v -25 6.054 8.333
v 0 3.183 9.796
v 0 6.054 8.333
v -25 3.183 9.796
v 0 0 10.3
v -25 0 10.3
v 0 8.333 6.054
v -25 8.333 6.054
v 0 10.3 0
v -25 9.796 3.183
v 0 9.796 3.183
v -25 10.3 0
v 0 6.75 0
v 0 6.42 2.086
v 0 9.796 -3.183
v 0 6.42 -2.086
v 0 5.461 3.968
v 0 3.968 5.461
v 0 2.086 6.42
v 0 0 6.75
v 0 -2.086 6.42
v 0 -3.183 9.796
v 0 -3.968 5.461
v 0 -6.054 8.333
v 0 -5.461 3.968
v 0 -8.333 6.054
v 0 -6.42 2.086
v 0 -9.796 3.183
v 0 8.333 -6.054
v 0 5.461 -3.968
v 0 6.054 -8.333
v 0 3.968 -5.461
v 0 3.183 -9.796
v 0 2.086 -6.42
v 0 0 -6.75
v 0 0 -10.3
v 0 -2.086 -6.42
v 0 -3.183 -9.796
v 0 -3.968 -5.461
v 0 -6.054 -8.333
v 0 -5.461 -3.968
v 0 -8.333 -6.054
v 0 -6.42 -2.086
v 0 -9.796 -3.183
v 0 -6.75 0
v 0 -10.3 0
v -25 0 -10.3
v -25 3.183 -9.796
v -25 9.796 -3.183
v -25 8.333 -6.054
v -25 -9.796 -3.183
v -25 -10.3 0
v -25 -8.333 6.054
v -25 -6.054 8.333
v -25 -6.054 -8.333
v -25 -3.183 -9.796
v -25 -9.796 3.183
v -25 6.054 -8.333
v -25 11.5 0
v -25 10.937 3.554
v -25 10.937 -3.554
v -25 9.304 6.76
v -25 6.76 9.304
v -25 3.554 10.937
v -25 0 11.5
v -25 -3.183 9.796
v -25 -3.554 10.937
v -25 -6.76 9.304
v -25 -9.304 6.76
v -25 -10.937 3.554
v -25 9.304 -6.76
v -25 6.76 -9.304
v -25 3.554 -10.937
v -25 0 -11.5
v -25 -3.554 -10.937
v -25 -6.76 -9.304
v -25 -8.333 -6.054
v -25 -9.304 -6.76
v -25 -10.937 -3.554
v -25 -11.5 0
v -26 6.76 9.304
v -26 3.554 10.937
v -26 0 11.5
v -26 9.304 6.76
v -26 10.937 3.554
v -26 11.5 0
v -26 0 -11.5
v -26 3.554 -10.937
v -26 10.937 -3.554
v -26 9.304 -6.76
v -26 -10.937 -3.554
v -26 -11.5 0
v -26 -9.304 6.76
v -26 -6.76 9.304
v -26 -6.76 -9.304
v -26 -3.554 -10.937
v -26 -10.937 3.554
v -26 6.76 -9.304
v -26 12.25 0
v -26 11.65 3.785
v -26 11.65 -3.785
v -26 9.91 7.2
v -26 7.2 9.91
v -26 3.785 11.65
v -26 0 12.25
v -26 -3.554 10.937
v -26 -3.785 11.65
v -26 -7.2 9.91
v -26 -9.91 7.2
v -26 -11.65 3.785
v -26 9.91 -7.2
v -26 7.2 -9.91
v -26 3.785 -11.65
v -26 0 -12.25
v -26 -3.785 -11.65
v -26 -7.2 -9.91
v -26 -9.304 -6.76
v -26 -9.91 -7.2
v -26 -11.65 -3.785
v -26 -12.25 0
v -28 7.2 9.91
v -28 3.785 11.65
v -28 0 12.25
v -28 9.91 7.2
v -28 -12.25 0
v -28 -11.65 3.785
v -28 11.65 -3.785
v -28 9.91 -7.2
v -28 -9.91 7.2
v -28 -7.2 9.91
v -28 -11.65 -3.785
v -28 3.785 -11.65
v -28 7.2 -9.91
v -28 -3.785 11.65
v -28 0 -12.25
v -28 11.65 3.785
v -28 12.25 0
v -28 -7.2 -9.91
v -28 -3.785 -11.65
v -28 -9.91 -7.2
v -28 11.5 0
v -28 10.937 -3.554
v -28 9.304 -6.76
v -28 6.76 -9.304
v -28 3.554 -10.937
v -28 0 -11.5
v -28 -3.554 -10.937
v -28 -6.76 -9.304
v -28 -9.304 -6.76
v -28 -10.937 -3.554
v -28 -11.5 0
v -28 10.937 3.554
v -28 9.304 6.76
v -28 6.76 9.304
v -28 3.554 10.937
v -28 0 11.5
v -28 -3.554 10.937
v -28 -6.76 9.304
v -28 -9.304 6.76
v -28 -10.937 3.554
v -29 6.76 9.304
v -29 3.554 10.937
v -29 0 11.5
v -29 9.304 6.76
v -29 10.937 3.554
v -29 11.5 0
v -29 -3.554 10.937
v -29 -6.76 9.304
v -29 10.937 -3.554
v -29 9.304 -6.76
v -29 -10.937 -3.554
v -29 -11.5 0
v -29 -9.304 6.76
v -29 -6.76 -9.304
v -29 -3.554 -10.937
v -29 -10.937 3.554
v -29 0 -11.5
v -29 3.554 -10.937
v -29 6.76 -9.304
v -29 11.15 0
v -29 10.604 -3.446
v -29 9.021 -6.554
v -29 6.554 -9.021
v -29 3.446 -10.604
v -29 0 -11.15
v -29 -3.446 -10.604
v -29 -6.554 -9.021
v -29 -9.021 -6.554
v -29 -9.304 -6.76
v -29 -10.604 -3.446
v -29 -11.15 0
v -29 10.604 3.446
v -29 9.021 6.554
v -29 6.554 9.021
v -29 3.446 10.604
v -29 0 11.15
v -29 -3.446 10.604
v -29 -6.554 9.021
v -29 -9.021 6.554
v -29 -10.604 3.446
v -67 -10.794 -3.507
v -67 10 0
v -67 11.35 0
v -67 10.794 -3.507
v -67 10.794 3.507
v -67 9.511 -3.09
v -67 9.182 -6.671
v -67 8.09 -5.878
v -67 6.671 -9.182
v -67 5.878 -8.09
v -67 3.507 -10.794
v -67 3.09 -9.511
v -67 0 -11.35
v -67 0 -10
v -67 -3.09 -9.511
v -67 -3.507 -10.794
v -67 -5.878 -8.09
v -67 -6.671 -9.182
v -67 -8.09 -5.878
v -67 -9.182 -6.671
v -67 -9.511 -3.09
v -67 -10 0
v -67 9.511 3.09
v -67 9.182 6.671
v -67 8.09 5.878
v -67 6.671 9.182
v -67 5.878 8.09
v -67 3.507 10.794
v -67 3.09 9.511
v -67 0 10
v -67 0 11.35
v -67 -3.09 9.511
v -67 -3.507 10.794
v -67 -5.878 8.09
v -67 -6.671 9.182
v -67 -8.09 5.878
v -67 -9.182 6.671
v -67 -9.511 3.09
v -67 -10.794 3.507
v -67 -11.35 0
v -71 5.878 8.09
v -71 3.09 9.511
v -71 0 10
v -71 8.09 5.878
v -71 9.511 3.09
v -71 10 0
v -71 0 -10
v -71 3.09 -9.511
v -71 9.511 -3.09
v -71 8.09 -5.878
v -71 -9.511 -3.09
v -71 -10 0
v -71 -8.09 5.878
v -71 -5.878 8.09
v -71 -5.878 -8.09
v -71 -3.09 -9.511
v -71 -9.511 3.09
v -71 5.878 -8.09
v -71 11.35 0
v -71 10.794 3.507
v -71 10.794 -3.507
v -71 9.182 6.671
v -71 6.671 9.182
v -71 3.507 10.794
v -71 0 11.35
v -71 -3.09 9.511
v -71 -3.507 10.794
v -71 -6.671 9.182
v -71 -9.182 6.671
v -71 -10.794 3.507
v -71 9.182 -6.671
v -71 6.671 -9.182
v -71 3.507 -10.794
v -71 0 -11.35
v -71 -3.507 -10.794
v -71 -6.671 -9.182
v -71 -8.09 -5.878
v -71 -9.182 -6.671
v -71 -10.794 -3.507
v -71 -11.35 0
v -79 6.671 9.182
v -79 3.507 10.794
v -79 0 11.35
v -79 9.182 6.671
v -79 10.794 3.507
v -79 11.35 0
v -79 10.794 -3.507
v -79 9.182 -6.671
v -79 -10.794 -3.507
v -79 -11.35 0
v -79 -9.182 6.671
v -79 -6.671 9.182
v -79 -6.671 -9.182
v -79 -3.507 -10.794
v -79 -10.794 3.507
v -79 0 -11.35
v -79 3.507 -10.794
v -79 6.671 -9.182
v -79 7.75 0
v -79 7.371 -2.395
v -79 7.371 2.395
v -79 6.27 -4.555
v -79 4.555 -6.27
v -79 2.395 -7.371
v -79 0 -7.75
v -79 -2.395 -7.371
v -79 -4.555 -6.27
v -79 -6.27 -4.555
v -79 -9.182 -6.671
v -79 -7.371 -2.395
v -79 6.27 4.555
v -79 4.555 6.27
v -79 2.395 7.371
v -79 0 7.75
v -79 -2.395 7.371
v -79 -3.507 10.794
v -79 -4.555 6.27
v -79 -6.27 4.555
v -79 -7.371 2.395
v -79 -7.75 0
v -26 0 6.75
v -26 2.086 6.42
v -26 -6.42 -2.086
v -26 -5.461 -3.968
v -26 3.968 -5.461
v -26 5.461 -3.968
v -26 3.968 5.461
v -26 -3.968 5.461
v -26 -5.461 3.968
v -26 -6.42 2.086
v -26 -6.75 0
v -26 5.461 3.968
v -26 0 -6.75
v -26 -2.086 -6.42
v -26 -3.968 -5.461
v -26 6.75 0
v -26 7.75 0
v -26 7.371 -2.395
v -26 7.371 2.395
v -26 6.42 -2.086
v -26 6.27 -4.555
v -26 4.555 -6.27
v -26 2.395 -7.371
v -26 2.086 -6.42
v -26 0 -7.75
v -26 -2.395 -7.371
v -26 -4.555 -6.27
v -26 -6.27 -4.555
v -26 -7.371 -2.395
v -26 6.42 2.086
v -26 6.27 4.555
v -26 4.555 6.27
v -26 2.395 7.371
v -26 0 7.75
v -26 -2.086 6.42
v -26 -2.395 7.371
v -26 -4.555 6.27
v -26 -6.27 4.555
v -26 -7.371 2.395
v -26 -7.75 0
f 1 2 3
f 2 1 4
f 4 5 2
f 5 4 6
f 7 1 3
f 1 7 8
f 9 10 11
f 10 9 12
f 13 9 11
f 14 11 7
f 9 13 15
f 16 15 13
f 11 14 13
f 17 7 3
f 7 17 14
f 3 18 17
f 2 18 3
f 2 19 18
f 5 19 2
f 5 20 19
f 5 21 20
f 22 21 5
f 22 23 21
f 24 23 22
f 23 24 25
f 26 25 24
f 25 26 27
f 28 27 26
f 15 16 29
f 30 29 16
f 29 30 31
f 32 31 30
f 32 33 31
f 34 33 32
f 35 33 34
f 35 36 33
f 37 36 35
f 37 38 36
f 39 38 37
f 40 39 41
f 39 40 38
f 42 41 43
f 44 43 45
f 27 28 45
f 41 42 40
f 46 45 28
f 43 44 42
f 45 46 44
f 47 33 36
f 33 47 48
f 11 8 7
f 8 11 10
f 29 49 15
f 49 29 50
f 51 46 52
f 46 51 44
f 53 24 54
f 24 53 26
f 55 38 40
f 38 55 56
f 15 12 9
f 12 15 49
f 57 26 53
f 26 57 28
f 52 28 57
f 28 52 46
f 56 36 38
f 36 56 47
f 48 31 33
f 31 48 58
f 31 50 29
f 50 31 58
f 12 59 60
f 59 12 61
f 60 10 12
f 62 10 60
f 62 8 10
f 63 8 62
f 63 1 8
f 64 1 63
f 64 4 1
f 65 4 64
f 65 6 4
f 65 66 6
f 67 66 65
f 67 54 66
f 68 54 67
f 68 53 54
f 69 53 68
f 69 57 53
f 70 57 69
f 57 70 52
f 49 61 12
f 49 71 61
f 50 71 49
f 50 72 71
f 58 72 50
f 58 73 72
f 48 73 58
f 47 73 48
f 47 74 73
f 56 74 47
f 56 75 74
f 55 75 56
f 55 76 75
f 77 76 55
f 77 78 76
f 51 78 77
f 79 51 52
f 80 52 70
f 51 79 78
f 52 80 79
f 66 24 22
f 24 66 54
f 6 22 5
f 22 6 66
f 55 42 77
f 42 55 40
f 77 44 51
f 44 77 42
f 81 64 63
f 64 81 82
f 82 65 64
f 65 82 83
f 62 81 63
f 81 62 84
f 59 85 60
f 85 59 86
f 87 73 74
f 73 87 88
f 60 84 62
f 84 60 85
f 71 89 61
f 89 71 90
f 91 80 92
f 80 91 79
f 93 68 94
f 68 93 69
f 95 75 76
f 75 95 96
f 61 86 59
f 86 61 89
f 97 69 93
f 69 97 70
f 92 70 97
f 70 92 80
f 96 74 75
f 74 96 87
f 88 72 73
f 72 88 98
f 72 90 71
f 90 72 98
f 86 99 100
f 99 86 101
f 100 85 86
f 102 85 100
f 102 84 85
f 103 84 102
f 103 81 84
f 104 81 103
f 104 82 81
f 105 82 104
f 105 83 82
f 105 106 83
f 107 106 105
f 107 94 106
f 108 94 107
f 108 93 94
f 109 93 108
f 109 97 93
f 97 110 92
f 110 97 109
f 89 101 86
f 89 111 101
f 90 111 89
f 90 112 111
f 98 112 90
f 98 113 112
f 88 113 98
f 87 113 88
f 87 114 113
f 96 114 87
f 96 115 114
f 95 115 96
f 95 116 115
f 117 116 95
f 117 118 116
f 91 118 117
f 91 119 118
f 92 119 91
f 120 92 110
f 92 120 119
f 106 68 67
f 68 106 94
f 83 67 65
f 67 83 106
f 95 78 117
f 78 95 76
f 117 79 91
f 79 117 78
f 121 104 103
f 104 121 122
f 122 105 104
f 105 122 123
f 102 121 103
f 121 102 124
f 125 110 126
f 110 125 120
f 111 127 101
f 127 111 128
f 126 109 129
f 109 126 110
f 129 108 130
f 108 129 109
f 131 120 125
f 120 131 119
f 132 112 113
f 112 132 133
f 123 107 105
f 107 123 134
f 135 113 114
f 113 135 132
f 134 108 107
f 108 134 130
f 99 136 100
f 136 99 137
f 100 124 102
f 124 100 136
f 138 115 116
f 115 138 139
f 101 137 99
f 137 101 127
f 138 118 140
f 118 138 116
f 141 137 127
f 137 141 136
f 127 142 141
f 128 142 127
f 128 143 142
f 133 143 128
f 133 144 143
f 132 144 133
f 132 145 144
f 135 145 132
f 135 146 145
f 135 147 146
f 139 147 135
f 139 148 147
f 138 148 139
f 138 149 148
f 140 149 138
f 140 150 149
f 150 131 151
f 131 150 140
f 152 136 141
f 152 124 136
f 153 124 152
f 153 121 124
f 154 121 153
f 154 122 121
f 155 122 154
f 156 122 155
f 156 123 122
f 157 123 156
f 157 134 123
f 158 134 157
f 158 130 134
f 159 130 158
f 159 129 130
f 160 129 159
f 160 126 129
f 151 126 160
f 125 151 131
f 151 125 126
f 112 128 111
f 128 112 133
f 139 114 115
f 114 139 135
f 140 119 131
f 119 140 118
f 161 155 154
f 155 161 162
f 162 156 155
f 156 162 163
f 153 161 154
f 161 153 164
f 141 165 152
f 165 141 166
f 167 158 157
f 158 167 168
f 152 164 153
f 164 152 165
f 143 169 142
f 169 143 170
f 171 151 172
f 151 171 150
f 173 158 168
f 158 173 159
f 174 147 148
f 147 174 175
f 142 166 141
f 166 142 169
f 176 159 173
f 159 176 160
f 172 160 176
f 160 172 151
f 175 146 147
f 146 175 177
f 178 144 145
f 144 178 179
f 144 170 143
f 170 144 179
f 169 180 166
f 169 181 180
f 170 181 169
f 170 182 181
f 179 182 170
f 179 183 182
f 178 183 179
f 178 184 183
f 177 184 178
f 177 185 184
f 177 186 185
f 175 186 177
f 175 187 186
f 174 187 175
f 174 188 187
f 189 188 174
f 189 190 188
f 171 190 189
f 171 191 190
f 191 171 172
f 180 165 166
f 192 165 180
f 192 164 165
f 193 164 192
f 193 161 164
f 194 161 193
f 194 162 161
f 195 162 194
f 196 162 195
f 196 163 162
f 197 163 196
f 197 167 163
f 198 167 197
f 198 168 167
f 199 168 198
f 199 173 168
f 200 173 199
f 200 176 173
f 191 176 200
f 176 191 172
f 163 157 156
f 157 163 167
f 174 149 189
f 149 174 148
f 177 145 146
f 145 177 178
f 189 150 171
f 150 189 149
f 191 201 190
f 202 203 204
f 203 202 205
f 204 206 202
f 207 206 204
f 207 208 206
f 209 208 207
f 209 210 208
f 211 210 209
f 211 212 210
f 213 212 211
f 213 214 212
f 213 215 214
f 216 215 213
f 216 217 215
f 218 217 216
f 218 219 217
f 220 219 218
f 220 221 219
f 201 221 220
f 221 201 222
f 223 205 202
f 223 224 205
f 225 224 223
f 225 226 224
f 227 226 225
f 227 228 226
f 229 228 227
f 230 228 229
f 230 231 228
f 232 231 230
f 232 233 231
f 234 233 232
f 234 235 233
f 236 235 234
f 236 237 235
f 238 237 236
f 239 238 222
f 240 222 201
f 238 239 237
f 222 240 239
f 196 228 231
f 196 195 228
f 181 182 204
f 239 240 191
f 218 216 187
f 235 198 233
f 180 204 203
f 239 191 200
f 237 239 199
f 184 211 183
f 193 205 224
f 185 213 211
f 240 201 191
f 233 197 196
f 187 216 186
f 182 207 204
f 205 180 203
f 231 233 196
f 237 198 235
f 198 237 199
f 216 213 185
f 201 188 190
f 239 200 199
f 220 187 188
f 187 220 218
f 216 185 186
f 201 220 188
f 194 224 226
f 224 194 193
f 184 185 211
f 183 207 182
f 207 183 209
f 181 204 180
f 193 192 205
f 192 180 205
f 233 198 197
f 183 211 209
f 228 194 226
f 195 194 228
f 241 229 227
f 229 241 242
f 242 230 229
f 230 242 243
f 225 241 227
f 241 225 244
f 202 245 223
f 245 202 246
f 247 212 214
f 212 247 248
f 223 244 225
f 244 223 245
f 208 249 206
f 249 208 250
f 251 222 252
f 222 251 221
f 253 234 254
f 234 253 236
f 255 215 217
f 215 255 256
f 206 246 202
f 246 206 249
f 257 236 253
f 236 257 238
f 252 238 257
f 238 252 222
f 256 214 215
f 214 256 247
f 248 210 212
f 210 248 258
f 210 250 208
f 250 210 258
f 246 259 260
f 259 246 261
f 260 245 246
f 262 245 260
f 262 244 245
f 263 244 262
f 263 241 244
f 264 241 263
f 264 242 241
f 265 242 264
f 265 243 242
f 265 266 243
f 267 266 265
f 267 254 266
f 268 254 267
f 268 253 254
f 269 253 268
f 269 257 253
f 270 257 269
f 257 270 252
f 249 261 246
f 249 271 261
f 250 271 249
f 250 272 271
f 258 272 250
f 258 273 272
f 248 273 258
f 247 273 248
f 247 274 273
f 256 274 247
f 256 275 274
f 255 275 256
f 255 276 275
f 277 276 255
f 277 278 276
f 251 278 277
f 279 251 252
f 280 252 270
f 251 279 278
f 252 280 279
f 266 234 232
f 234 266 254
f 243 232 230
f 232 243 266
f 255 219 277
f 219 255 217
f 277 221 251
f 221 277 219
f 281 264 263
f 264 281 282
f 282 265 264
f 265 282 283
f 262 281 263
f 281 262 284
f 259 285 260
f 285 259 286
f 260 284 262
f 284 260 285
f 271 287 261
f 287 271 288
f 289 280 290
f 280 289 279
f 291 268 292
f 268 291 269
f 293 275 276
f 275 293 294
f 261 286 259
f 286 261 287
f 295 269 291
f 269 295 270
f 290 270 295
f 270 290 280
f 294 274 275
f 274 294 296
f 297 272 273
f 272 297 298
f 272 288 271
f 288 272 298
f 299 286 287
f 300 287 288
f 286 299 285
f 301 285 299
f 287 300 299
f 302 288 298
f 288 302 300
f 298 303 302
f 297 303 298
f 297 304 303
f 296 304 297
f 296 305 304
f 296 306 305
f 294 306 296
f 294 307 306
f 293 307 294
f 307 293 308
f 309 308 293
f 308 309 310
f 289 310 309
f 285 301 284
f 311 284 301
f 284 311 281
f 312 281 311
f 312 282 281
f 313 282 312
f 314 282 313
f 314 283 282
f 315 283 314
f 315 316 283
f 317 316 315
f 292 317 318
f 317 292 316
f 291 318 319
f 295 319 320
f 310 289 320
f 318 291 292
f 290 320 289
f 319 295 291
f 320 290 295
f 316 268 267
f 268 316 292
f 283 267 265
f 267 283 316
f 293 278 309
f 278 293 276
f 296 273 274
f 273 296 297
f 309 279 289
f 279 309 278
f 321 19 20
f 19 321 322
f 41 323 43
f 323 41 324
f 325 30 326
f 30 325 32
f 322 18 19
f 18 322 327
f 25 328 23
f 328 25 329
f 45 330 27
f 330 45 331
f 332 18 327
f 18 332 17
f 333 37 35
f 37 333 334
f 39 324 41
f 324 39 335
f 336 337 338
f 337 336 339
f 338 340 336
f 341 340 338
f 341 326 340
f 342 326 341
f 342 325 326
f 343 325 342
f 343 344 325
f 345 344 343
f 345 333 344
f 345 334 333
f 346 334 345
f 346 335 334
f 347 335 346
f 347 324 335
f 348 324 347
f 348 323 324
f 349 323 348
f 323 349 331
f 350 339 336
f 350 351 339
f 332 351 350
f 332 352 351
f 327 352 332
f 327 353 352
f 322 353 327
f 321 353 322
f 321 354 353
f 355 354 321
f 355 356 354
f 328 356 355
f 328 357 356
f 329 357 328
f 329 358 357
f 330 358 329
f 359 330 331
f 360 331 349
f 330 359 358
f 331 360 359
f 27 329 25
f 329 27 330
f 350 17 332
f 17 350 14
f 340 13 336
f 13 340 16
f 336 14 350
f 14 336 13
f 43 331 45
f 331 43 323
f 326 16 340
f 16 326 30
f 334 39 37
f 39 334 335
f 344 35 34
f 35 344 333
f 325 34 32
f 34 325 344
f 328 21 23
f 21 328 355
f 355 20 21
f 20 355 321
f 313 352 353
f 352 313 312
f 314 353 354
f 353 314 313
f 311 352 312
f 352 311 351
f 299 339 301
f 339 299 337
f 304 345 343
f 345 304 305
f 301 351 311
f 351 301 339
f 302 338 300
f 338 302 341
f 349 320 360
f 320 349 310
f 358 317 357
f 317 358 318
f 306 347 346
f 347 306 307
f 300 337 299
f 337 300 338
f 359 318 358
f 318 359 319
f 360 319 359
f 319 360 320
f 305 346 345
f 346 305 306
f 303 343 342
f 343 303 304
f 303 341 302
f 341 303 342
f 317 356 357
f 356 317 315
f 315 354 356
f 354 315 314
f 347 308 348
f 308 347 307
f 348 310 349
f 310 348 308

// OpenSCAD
// openNSP_project, chanter and blowpipe stock version 1.0
// Zexuan Qiao, 2024
// under GPL license ver3

stockLOA = 80; //.1

ferruleWood = 25; //.1
ferruleWoodDiameter = 20.6; //.1

decoration1 = 1; //.1
decoration2 = 2; //.1
decoration3 = 1; //.1
decoration1Diameter = 23; //.1
decoration2Diameter = 24.5; //.1
decoration3Diameter = 23; //.1

main = 38; //.1
mainDiameter1 = 22.3; //.1
mainDiameter2 = 22.7; //.1

groove = 4; //.1
grooveDiameter = 20; //.1

bagEnd = 8; //.1


boreDiameter1 = 15.5; //.1
tenon = 26; //.1
boreDiameter2 = 13.5; //.1

/* [Utilities] */
// Segments, the higher the value, the smoother the surface would be.
$fn = 20;

rotate([0,-90,0]) difference(){
union(){
cylinder(h = ferruleWood, d = ferruleWoodDiameter);
translate([0,0,ferruleWood]) cylinder(h = decoration1, d = decoration1Diameter);
translate([0,0,ferruleWood+decoration1]) cylinder(h = decoration2, d = decoration2Diameter);
translate([0,0,ferruleWood+decoration1+decoration2])cylinder(h = decoration3, d = decoration3Diameter);
translate([0,0,ferruleWood+decoration1+decoration2+decoration3]) cylinder(h = main, d1 = mainDiameter1, d2 = mainDiameter2);
translate([0,0,ferruleWood+decoration1+decoration2+decoration3+main]) cylinder(h = groove, d = grooveDiameter);
translate([0,0,ferruleWood+decoration1+decoration2+decoration3+main]) cylinder(h = groove, d = grooveDiameter);
translate([0,0,ferruleWood+decoration1+decoration2+decoration3+main+groove]) cylinder(h = bagEnd, d = mainDiameter2);
}
translate([0,0,0]) cylinder(h = tenon, d = boreDiameter2);
translate([0,0,tenon]) cylinder(h = stockLOA-tenon, d = boreDiameter1);
}
